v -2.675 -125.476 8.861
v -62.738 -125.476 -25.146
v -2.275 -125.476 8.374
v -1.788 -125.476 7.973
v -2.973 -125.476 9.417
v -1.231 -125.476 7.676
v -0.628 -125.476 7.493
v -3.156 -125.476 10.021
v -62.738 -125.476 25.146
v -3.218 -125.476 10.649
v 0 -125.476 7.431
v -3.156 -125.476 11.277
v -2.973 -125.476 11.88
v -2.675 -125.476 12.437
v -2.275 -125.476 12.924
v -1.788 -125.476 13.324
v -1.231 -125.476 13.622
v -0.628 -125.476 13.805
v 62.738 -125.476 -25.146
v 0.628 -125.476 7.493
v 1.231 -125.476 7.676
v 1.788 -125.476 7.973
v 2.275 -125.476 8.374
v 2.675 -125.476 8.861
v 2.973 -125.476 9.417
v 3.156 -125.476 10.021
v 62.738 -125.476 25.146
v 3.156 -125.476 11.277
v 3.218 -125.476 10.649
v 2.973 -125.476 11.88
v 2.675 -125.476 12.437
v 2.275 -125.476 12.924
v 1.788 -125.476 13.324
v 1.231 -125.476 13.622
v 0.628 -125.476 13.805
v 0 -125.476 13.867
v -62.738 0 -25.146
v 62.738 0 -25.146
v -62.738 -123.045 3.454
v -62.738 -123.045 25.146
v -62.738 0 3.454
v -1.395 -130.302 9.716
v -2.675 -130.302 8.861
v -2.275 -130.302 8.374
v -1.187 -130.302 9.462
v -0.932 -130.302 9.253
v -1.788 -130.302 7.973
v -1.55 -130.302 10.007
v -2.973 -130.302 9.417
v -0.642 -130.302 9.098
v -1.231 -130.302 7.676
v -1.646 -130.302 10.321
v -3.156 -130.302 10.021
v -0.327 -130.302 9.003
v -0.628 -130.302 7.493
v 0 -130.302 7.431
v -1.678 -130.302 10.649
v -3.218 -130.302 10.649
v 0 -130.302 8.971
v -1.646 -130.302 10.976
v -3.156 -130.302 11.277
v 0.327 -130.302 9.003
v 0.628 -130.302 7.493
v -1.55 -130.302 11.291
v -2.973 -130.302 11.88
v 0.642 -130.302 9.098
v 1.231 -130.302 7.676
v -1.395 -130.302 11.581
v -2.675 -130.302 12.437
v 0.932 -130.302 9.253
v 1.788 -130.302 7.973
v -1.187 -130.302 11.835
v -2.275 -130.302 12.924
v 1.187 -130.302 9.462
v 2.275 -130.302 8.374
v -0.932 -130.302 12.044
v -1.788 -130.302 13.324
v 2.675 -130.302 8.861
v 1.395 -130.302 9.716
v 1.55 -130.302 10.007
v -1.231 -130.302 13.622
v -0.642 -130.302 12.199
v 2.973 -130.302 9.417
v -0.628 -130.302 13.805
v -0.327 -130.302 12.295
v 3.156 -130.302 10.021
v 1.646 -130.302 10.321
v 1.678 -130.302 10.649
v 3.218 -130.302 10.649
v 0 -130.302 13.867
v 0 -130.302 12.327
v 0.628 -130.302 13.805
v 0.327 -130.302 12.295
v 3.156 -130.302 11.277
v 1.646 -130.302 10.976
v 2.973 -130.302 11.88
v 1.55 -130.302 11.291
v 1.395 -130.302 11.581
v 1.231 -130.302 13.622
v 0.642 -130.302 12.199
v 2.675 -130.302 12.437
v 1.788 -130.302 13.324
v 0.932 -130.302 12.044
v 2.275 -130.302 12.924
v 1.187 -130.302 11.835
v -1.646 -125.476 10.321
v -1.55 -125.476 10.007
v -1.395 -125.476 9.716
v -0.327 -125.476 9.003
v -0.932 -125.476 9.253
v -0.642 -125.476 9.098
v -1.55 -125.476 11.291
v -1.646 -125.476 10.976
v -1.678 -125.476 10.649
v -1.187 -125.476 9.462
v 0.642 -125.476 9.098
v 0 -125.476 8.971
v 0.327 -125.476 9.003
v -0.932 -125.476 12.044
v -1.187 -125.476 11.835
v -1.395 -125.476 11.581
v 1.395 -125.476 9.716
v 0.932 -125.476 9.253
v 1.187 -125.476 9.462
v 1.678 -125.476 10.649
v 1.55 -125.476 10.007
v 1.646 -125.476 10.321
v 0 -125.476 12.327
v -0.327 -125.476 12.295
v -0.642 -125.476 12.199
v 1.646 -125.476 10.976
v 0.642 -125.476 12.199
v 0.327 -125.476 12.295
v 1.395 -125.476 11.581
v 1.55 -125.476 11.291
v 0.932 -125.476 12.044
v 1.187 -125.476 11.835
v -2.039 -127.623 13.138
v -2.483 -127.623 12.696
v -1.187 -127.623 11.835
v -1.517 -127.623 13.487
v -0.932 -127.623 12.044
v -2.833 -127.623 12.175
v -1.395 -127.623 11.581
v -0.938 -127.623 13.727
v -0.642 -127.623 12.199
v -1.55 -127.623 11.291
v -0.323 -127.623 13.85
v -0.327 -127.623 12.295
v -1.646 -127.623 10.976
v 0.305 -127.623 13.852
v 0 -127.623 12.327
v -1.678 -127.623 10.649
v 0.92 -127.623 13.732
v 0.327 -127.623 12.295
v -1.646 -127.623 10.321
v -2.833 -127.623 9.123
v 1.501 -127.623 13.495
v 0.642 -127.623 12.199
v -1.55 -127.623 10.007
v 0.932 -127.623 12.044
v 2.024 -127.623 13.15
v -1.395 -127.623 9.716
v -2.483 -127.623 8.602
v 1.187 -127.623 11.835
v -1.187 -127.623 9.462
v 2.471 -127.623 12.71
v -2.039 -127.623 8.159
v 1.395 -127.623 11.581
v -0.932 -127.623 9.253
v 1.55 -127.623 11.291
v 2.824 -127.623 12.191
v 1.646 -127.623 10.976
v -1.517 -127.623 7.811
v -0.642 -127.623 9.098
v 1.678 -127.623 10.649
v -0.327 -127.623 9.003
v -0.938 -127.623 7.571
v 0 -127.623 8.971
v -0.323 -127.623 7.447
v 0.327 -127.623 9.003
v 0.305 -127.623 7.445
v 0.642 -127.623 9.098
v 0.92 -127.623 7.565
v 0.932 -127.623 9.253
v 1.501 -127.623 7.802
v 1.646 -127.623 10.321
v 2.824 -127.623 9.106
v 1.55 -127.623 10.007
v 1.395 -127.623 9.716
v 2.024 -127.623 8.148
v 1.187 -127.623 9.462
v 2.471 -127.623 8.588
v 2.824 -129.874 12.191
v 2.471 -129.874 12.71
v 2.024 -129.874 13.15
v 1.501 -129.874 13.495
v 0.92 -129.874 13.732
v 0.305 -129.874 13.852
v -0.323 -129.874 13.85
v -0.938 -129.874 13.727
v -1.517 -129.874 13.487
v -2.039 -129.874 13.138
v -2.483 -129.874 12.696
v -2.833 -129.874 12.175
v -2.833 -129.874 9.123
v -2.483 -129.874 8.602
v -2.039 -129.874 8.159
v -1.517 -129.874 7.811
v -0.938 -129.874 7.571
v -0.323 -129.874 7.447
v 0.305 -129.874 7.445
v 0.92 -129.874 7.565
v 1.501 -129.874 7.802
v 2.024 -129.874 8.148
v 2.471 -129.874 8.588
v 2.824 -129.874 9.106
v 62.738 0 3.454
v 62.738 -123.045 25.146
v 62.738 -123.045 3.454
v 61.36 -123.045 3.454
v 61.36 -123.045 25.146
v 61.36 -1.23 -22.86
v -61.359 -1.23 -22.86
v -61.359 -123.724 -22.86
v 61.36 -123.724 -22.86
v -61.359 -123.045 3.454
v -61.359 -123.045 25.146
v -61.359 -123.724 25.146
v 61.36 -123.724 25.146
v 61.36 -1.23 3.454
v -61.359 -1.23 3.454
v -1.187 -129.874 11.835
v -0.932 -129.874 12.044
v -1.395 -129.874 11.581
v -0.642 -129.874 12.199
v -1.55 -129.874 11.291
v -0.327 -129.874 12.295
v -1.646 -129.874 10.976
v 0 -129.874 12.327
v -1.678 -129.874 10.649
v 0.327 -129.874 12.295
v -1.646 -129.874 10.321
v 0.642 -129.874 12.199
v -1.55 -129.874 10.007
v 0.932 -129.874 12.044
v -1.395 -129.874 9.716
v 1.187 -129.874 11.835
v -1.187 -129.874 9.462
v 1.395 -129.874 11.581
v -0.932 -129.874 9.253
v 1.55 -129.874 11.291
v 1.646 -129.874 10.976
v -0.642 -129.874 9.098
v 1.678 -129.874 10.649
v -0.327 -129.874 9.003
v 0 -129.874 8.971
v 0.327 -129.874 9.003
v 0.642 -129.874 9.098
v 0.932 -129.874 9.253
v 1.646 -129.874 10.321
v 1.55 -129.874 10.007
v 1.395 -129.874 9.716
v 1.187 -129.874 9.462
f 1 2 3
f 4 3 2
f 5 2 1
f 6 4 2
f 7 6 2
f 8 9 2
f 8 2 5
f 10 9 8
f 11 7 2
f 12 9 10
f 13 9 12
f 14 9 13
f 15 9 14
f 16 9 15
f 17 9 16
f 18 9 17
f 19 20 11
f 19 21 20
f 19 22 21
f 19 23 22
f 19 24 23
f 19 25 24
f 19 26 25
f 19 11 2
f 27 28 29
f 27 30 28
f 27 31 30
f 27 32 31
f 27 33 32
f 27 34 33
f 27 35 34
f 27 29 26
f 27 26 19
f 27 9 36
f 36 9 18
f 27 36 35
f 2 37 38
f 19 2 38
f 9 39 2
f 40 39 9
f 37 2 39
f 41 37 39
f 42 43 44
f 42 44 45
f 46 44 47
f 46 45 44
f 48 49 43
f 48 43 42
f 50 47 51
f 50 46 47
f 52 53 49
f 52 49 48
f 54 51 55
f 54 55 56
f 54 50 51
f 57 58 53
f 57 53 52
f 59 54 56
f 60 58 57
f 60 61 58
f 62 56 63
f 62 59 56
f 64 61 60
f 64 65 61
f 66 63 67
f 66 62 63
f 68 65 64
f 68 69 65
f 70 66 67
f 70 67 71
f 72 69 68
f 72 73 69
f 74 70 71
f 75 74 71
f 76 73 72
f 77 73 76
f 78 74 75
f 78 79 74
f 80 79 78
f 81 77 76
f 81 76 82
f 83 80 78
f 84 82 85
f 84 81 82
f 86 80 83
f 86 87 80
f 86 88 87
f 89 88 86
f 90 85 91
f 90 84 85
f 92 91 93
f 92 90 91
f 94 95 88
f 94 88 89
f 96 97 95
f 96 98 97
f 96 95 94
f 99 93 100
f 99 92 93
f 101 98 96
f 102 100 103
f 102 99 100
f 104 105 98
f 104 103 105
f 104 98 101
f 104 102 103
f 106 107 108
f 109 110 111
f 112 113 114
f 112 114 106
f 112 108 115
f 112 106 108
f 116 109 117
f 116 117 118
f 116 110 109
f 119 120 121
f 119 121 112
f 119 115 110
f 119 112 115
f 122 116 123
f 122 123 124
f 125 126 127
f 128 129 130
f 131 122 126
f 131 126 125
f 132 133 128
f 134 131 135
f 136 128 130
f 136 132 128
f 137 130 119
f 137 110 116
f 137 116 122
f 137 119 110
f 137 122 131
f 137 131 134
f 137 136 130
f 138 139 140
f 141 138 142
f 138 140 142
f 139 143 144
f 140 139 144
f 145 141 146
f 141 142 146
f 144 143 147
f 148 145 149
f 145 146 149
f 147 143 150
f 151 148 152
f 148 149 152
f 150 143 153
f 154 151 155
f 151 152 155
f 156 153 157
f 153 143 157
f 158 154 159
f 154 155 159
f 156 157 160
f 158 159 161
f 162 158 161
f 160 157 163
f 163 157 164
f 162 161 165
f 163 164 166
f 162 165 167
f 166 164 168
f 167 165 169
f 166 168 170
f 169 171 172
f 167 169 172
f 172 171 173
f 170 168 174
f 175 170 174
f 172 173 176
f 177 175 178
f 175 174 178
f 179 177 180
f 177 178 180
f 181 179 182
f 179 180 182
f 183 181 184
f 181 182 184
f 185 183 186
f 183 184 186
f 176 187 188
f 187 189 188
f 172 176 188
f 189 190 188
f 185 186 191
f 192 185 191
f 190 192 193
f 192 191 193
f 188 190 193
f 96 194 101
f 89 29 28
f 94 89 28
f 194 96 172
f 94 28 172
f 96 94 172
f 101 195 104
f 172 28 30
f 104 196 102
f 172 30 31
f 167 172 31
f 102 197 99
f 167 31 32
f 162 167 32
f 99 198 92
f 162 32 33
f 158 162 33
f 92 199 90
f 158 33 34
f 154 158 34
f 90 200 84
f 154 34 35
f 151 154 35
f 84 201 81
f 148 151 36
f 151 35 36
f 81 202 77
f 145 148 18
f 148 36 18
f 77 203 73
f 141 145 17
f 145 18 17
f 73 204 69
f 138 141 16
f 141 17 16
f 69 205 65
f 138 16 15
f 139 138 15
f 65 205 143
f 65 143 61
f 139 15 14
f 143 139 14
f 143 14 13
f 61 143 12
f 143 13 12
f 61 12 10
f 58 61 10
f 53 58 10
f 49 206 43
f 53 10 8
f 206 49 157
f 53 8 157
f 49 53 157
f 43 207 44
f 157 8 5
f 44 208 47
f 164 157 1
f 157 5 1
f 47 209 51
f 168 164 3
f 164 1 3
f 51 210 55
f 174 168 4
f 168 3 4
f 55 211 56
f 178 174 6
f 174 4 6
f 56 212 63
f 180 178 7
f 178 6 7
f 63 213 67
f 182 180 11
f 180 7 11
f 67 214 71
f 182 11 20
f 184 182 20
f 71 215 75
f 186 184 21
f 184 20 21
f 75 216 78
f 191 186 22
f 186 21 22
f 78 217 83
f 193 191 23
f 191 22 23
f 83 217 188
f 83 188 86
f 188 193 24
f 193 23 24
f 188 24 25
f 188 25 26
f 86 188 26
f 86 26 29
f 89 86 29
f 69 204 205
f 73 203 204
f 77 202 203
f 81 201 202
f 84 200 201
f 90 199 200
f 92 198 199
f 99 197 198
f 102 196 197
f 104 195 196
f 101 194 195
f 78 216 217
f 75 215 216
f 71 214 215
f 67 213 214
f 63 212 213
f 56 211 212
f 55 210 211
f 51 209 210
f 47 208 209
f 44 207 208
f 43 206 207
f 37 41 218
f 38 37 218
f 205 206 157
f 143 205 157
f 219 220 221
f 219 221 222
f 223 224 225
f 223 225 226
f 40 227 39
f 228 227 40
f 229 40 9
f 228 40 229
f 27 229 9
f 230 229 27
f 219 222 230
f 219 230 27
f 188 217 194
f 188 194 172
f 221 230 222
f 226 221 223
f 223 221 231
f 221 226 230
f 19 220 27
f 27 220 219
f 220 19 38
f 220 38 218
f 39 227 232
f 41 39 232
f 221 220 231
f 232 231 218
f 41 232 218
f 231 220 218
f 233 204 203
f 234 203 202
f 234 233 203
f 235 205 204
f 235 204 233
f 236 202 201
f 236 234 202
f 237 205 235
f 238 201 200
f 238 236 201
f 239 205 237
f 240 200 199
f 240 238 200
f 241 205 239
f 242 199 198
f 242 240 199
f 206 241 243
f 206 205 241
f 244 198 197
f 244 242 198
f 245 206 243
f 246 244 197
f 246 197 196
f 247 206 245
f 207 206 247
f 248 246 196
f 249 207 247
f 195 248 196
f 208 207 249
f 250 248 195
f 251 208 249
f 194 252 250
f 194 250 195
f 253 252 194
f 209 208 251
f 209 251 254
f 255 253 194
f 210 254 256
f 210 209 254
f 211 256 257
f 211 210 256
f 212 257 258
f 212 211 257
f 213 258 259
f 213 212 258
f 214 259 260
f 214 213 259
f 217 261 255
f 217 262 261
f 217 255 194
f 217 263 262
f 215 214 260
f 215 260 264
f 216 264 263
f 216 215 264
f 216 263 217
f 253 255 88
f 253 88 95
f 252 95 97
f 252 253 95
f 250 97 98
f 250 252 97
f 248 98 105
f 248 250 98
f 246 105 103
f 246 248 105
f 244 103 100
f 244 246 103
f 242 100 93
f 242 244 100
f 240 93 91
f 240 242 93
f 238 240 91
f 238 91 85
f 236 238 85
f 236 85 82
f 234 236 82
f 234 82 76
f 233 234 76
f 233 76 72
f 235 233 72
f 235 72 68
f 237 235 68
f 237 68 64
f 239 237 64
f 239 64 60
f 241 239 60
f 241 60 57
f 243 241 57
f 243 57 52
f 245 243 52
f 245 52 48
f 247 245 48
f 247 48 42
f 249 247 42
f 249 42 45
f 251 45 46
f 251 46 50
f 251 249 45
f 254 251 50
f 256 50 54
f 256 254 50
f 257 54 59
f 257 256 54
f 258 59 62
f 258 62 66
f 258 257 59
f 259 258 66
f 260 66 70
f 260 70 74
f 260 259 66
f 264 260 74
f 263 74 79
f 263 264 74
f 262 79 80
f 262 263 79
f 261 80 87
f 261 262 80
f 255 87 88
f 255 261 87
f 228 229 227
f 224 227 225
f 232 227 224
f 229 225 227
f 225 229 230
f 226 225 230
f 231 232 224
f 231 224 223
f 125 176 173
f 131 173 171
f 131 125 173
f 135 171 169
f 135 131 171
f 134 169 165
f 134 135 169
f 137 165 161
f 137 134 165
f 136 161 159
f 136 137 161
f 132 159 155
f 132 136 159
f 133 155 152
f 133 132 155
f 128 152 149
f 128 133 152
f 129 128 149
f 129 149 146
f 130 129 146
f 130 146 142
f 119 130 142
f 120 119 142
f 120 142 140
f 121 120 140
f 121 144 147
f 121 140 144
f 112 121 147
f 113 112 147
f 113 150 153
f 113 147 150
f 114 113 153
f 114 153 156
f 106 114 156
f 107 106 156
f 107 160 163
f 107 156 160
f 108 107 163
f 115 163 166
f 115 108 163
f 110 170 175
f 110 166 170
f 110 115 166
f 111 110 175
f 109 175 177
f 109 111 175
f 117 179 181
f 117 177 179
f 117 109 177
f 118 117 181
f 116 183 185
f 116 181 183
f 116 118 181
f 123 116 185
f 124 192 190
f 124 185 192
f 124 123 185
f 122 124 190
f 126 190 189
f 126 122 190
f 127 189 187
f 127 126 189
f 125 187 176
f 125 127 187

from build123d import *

# Parameters (mm, degrees)
F0_W      = 125.476
F0_H      = 50.292
F1_DEPTH  = 125.476
F2_W      = 122.7189972997
F2_H      = 122.4945134018
F3_DEPTH  = 48.006
F5_R      = 3.2177672419
F5_R_2    = 1.6781805888
F6_DEPTH  = 4.826
F7_W      = 80.5568695068
F7_H      = 21.6923308617
F8_DEPTH  = 125.477
F9_W      = 42.4876958132
F9_H      = 25.0391000882
F10_DEPTH = 125.477
F11_W     = 5.6567939464
F11_H     = 2.2512227297
F12_DEPTH = 48.007


# Not quite as in the source:
# - a feature names something its author has since deleted; it is built from what else it names


with BuildPart() as f1:
    # F0 (on Front) → F1 (new body)
    with BuildSketch(Plane.XZ):
        Rectangle(F0_W, F0_H)
    extrude(amount=F1_DEPTH)

    # F2 (on face) → F3 (cut)
    with BuildSketch(Plane.XY.offset(25.146)):
        with Locations((7.4506e-06, -62.4770697905)):
            Rectangle(F2_W, F2_H)
    extrude(amount=-F3_DEPTH, mode=Mode.SUBTRACT)

    # F5 (on face) → F6 (join)
    with BuildSketch(Plane.XZ.offset(125.476)):
        with Locations((0, 10.6488130987)):
            Circle(F5_R)
        with Locations((0, 10.6488130987)):
            Circle(F5_R_2, mode=Mode.SUBTRACT)
    extrude(amount=F6_DEPTH)

    # F7 (on face) → F8 (cut, through all)
    with BuildSketch(Plane.YZ.offset(62.738)):
        with Locations((-40.2784347534, 14.2998345691)):
            Rectangle(F7_W, F7_H)
    extrude(amount=-F8_DEPTH, mode=Mode.SUBTRACT)

    # F9 (on face) → F10 (cut, through all)
    with BuildSketch(Plane.YZ.offset(62.738)):
        with Locations((-101.8007174134, 15.9732191823)):
            Rectangle(F9_W, F9_H)
    extrude(amount=-F10_DEPTH, mode=Mode.SUBTRACT)

    # F11 (on face) → F12 (cut, through all)
    with BuildSketch(Plane.XY.offset(-22.86)):
        with Locations((-0.0043596374, -128.7486031651)):
            Rectangle(F11_W, F11_H)
    extrude(amount=F12_DEPTH, mode=Mode.SUBTRACT)


solid = f1.part
